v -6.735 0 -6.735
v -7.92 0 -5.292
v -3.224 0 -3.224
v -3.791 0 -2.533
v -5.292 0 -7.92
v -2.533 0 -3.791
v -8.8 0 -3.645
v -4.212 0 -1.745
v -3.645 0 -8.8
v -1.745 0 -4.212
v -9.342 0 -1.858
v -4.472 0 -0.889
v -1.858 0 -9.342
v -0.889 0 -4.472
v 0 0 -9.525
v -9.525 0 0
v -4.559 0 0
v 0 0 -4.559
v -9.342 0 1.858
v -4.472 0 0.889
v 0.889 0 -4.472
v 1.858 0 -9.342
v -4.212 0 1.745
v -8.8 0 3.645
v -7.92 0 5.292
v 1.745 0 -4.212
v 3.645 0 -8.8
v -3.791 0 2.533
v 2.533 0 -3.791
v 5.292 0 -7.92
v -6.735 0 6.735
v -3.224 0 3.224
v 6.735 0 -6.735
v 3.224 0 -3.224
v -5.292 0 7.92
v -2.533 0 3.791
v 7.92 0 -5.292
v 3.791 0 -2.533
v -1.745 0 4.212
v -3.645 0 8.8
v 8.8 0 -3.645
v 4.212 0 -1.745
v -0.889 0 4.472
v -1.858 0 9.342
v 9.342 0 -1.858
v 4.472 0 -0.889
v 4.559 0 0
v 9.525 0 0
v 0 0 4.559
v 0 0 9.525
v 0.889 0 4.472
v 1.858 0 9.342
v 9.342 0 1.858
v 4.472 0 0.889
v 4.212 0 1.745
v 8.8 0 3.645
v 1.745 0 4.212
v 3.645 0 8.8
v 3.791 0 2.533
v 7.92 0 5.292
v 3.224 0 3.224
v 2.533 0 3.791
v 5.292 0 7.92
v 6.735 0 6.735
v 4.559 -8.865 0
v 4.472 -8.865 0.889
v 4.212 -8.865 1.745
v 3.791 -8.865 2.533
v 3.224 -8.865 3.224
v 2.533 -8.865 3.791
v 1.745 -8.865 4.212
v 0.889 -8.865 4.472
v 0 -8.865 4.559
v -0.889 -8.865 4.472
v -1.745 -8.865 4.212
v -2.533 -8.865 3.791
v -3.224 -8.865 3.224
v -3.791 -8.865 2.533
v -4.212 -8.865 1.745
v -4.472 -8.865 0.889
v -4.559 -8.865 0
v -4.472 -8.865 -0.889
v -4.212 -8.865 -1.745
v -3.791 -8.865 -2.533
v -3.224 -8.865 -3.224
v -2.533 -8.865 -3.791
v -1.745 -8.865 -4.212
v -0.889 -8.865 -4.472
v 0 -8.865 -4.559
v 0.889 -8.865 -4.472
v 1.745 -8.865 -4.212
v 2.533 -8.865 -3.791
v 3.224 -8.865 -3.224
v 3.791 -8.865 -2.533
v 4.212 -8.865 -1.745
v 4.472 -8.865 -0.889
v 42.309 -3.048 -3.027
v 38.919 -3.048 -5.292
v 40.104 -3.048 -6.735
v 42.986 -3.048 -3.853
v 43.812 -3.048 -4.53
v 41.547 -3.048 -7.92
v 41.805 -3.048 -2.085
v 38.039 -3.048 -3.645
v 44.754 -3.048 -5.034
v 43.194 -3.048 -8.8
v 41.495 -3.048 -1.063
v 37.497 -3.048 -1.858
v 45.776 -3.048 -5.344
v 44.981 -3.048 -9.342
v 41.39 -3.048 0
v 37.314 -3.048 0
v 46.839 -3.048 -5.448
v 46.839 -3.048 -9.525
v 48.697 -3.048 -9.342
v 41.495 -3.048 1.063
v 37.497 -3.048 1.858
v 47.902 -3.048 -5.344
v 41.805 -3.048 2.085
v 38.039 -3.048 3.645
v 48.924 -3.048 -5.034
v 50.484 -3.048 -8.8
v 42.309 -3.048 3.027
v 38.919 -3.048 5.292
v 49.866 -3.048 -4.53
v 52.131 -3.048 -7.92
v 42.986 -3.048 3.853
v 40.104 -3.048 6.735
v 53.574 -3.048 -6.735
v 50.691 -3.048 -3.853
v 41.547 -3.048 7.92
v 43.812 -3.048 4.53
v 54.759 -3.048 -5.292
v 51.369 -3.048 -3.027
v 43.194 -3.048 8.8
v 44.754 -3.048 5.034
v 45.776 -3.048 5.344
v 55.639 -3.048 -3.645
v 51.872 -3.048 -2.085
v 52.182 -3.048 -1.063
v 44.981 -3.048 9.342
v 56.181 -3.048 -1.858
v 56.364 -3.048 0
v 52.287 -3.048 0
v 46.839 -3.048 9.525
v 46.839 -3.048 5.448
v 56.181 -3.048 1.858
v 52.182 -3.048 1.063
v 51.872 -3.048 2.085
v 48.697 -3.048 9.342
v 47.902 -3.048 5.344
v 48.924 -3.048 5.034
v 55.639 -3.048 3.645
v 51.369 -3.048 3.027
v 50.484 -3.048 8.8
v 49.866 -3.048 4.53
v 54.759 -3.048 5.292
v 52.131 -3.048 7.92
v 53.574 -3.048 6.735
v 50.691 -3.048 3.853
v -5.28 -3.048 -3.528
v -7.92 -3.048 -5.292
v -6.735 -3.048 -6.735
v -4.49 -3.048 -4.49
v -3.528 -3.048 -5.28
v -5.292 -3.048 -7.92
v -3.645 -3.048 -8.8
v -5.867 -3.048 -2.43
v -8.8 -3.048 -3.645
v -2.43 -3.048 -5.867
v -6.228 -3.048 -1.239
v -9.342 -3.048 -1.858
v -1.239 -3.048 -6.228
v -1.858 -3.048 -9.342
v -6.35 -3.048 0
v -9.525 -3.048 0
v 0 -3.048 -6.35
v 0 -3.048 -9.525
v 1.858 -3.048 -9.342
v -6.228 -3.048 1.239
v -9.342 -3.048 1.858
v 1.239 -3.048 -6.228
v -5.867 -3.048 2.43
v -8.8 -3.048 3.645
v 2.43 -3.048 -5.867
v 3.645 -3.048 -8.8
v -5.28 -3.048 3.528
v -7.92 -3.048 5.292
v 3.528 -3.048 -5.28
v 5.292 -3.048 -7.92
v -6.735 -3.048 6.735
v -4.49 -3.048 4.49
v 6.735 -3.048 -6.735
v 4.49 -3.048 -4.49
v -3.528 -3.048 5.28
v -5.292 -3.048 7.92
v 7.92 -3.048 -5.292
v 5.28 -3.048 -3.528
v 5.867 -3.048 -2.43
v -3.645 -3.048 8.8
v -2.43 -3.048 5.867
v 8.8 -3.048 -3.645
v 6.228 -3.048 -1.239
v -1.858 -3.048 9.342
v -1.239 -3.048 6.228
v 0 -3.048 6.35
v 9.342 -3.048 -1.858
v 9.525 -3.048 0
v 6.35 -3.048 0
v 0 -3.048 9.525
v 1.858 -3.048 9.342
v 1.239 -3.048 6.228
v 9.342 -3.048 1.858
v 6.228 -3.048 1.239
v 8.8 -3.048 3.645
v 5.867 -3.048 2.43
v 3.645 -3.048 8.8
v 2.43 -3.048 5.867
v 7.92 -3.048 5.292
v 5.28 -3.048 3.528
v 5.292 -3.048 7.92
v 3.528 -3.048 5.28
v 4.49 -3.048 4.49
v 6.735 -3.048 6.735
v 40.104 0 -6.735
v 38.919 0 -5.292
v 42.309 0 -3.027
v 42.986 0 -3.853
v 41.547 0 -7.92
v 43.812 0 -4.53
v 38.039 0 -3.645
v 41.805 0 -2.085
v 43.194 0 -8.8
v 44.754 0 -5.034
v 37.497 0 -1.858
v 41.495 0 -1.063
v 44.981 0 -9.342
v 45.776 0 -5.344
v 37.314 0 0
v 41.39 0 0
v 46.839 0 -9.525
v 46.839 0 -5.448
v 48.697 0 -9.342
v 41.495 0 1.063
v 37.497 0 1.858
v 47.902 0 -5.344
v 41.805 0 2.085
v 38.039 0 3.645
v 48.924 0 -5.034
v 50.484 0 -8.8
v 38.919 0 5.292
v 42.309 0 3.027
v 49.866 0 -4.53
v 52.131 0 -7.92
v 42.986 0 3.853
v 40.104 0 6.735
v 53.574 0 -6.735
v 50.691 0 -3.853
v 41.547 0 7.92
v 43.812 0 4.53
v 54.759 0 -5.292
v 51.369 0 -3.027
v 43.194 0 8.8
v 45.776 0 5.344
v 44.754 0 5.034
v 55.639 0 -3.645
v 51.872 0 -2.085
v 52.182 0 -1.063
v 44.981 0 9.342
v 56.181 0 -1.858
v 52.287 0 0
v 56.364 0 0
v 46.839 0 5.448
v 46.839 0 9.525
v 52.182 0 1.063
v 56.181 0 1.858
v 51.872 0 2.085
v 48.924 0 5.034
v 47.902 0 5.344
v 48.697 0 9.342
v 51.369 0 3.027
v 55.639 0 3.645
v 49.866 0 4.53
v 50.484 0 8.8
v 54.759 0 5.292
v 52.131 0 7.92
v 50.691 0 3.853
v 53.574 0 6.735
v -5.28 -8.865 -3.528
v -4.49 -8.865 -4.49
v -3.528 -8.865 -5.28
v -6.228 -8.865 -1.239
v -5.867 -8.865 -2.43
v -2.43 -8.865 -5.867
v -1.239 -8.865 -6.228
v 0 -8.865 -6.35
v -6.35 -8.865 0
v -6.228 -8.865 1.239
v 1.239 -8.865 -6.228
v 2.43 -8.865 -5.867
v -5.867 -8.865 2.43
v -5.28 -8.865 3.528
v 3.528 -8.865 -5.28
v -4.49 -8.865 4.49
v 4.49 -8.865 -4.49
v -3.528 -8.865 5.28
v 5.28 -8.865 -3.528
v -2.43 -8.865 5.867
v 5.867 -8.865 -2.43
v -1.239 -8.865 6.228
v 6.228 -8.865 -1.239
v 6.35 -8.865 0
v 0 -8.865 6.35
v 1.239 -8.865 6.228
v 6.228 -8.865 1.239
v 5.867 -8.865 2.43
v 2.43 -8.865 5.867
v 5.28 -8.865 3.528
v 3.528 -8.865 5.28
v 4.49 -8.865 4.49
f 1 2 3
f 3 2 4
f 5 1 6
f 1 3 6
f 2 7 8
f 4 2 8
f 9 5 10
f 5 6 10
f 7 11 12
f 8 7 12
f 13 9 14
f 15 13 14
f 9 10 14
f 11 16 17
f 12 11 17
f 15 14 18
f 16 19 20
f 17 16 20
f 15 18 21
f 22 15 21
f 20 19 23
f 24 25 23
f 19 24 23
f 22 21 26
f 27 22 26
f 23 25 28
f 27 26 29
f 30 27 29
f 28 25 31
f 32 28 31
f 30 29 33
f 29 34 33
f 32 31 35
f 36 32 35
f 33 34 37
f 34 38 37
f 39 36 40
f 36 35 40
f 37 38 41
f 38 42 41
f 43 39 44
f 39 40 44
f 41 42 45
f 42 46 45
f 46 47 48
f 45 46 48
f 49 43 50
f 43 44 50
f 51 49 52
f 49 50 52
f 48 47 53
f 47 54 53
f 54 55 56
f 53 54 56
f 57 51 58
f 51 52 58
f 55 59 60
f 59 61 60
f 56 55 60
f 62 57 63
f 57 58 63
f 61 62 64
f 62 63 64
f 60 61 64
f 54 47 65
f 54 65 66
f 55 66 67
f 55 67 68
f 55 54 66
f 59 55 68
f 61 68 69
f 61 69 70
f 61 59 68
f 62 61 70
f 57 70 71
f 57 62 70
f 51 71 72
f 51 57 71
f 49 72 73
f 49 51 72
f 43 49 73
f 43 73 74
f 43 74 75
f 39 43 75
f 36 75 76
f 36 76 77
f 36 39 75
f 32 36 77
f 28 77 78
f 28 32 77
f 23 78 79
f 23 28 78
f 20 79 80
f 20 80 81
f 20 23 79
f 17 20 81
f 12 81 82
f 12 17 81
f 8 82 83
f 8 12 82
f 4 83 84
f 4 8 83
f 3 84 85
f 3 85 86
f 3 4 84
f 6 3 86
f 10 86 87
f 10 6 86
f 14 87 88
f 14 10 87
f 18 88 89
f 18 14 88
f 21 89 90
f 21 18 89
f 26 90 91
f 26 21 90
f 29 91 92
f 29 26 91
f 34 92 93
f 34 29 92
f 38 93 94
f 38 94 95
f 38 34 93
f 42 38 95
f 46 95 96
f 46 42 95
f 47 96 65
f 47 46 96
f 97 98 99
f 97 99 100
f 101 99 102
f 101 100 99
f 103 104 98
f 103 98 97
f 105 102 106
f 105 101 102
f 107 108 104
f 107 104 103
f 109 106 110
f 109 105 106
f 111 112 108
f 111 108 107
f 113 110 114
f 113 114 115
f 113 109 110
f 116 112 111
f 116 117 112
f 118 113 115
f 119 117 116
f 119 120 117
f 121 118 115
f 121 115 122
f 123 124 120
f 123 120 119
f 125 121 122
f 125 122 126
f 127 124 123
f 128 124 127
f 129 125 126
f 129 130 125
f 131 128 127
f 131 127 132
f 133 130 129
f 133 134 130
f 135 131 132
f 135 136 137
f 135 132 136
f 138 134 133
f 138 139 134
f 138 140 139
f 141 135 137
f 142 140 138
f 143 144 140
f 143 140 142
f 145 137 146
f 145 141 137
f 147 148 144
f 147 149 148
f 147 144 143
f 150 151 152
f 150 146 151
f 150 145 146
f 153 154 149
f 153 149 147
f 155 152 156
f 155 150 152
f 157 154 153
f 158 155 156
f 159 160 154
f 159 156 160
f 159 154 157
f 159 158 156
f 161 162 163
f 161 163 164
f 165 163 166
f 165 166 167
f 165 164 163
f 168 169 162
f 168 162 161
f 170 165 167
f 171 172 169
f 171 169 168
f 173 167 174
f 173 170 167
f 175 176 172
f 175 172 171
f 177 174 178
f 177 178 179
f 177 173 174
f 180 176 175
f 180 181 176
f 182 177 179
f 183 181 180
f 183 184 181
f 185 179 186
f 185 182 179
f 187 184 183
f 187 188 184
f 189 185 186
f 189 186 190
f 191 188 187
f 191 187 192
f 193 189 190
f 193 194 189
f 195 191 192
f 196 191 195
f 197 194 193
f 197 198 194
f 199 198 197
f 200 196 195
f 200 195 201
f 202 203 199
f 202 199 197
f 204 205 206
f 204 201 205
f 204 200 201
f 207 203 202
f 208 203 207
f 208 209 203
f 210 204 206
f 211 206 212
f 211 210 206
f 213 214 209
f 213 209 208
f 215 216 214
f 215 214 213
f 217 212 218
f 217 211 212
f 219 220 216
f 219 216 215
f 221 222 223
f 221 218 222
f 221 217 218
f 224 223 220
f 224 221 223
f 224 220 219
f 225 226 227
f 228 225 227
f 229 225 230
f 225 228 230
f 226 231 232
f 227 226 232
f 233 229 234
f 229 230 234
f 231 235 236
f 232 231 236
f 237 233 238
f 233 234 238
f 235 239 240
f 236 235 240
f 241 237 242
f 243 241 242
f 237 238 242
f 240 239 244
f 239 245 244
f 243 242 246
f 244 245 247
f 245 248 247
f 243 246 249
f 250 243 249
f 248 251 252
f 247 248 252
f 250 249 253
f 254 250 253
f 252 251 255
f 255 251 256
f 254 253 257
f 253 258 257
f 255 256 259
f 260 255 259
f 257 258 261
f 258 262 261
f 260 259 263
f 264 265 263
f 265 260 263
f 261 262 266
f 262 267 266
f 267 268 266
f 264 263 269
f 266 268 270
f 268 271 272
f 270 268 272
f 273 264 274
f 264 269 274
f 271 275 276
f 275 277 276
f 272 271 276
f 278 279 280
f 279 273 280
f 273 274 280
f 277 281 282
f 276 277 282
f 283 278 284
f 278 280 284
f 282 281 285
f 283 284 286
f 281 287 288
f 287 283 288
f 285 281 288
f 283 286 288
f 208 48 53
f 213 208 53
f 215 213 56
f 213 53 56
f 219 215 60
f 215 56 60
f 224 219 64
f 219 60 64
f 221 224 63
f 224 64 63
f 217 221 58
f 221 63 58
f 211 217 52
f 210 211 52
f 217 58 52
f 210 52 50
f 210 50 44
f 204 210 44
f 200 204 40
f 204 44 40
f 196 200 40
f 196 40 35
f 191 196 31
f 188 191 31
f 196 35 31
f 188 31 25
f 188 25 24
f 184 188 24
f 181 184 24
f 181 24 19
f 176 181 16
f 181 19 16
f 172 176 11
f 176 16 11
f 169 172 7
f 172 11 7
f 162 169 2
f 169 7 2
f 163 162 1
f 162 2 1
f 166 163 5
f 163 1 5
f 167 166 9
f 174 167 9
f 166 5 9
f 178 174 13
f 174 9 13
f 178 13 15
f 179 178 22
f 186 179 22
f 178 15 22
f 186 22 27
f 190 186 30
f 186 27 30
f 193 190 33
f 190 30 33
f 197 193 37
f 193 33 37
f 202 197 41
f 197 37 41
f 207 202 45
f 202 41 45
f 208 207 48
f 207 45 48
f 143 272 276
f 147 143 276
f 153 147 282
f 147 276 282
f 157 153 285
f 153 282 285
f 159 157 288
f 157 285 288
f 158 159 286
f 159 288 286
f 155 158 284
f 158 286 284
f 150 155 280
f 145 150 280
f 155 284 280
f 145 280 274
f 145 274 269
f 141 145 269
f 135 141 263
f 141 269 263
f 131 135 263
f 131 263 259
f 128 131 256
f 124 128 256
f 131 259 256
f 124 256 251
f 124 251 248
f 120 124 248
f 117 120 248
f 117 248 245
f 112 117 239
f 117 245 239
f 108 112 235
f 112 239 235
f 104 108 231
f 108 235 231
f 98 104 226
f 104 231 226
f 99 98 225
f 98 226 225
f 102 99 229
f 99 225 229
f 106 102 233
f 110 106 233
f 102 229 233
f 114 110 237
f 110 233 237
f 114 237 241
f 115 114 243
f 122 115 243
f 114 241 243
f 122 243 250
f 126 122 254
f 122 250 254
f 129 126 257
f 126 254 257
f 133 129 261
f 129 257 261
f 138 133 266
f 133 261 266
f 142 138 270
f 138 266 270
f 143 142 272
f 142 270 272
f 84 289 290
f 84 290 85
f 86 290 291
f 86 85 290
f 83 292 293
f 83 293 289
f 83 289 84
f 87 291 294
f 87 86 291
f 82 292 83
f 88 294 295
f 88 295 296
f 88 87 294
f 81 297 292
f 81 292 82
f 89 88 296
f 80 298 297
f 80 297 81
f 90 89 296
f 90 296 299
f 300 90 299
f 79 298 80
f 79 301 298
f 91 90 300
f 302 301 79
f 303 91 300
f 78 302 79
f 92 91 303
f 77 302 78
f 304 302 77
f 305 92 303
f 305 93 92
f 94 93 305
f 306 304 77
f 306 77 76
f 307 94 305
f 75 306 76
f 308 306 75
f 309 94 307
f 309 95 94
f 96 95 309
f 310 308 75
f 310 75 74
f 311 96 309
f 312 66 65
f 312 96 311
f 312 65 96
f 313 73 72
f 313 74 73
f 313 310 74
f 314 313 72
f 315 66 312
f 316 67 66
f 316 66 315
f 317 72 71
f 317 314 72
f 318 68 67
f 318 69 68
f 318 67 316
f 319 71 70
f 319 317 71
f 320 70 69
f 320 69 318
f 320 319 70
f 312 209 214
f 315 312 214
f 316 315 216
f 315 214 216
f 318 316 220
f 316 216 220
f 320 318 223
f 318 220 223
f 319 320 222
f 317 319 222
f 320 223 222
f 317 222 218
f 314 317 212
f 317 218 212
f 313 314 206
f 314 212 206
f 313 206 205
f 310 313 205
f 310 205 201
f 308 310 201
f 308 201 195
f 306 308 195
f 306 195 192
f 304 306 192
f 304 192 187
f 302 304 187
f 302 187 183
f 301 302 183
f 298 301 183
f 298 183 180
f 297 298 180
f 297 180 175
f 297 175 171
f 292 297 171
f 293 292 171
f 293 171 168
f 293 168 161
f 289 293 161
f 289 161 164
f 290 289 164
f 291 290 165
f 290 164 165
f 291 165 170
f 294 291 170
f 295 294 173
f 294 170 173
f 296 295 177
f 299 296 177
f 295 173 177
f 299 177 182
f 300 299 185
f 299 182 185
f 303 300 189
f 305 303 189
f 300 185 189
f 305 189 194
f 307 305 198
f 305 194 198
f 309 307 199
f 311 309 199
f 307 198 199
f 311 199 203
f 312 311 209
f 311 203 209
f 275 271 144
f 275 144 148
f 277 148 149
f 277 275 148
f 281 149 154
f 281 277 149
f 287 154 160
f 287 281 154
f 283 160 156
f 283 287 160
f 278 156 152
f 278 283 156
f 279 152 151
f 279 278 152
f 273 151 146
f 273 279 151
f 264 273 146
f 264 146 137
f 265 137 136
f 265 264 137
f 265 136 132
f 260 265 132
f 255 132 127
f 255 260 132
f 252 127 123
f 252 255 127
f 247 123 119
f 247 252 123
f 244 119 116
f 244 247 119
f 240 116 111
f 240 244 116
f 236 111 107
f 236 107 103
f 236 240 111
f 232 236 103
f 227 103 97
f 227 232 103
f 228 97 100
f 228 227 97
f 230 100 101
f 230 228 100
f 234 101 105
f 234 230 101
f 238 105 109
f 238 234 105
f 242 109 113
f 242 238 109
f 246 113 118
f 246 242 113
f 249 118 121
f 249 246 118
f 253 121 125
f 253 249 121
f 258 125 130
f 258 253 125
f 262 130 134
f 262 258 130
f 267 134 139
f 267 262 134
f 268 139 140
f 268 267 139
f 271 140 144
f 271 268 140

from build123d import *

# Parameters (mm, degrees)
F0_R     = 9.525
F0_R_2   = 6.35
F0_R_3   = 5.4483
F1_DEPTH = 3.048
F0_R_4   = 4.5593
F2_DEPTH = 8.8646


with BuildPart() as f1:
    # F0 (on Front) → F1 (new body)
    with BuildSketch(Plane.XZ):
        Circle(F0_R)
        Circle(F0_R_2, mode=Mode.SUBTRACT)
        with Locations((46.838772, 0)):
            Circle(F0_R)
        with Locations((46.838772, 0)):
            Circle(F0_R_3, mode=Mode.SUBTRACT)
    extrude(amount=F1_DEPTH)

    # F0 (on Front) → F2 (join)
    with BuildSketch(Plane.XZ):
        Circle(F0_R_2)
        Circle(F0_R_4, mode=Mode.SUBTRACT)
    extrude(amount=F2_DEPTH)


solid = f1.part
